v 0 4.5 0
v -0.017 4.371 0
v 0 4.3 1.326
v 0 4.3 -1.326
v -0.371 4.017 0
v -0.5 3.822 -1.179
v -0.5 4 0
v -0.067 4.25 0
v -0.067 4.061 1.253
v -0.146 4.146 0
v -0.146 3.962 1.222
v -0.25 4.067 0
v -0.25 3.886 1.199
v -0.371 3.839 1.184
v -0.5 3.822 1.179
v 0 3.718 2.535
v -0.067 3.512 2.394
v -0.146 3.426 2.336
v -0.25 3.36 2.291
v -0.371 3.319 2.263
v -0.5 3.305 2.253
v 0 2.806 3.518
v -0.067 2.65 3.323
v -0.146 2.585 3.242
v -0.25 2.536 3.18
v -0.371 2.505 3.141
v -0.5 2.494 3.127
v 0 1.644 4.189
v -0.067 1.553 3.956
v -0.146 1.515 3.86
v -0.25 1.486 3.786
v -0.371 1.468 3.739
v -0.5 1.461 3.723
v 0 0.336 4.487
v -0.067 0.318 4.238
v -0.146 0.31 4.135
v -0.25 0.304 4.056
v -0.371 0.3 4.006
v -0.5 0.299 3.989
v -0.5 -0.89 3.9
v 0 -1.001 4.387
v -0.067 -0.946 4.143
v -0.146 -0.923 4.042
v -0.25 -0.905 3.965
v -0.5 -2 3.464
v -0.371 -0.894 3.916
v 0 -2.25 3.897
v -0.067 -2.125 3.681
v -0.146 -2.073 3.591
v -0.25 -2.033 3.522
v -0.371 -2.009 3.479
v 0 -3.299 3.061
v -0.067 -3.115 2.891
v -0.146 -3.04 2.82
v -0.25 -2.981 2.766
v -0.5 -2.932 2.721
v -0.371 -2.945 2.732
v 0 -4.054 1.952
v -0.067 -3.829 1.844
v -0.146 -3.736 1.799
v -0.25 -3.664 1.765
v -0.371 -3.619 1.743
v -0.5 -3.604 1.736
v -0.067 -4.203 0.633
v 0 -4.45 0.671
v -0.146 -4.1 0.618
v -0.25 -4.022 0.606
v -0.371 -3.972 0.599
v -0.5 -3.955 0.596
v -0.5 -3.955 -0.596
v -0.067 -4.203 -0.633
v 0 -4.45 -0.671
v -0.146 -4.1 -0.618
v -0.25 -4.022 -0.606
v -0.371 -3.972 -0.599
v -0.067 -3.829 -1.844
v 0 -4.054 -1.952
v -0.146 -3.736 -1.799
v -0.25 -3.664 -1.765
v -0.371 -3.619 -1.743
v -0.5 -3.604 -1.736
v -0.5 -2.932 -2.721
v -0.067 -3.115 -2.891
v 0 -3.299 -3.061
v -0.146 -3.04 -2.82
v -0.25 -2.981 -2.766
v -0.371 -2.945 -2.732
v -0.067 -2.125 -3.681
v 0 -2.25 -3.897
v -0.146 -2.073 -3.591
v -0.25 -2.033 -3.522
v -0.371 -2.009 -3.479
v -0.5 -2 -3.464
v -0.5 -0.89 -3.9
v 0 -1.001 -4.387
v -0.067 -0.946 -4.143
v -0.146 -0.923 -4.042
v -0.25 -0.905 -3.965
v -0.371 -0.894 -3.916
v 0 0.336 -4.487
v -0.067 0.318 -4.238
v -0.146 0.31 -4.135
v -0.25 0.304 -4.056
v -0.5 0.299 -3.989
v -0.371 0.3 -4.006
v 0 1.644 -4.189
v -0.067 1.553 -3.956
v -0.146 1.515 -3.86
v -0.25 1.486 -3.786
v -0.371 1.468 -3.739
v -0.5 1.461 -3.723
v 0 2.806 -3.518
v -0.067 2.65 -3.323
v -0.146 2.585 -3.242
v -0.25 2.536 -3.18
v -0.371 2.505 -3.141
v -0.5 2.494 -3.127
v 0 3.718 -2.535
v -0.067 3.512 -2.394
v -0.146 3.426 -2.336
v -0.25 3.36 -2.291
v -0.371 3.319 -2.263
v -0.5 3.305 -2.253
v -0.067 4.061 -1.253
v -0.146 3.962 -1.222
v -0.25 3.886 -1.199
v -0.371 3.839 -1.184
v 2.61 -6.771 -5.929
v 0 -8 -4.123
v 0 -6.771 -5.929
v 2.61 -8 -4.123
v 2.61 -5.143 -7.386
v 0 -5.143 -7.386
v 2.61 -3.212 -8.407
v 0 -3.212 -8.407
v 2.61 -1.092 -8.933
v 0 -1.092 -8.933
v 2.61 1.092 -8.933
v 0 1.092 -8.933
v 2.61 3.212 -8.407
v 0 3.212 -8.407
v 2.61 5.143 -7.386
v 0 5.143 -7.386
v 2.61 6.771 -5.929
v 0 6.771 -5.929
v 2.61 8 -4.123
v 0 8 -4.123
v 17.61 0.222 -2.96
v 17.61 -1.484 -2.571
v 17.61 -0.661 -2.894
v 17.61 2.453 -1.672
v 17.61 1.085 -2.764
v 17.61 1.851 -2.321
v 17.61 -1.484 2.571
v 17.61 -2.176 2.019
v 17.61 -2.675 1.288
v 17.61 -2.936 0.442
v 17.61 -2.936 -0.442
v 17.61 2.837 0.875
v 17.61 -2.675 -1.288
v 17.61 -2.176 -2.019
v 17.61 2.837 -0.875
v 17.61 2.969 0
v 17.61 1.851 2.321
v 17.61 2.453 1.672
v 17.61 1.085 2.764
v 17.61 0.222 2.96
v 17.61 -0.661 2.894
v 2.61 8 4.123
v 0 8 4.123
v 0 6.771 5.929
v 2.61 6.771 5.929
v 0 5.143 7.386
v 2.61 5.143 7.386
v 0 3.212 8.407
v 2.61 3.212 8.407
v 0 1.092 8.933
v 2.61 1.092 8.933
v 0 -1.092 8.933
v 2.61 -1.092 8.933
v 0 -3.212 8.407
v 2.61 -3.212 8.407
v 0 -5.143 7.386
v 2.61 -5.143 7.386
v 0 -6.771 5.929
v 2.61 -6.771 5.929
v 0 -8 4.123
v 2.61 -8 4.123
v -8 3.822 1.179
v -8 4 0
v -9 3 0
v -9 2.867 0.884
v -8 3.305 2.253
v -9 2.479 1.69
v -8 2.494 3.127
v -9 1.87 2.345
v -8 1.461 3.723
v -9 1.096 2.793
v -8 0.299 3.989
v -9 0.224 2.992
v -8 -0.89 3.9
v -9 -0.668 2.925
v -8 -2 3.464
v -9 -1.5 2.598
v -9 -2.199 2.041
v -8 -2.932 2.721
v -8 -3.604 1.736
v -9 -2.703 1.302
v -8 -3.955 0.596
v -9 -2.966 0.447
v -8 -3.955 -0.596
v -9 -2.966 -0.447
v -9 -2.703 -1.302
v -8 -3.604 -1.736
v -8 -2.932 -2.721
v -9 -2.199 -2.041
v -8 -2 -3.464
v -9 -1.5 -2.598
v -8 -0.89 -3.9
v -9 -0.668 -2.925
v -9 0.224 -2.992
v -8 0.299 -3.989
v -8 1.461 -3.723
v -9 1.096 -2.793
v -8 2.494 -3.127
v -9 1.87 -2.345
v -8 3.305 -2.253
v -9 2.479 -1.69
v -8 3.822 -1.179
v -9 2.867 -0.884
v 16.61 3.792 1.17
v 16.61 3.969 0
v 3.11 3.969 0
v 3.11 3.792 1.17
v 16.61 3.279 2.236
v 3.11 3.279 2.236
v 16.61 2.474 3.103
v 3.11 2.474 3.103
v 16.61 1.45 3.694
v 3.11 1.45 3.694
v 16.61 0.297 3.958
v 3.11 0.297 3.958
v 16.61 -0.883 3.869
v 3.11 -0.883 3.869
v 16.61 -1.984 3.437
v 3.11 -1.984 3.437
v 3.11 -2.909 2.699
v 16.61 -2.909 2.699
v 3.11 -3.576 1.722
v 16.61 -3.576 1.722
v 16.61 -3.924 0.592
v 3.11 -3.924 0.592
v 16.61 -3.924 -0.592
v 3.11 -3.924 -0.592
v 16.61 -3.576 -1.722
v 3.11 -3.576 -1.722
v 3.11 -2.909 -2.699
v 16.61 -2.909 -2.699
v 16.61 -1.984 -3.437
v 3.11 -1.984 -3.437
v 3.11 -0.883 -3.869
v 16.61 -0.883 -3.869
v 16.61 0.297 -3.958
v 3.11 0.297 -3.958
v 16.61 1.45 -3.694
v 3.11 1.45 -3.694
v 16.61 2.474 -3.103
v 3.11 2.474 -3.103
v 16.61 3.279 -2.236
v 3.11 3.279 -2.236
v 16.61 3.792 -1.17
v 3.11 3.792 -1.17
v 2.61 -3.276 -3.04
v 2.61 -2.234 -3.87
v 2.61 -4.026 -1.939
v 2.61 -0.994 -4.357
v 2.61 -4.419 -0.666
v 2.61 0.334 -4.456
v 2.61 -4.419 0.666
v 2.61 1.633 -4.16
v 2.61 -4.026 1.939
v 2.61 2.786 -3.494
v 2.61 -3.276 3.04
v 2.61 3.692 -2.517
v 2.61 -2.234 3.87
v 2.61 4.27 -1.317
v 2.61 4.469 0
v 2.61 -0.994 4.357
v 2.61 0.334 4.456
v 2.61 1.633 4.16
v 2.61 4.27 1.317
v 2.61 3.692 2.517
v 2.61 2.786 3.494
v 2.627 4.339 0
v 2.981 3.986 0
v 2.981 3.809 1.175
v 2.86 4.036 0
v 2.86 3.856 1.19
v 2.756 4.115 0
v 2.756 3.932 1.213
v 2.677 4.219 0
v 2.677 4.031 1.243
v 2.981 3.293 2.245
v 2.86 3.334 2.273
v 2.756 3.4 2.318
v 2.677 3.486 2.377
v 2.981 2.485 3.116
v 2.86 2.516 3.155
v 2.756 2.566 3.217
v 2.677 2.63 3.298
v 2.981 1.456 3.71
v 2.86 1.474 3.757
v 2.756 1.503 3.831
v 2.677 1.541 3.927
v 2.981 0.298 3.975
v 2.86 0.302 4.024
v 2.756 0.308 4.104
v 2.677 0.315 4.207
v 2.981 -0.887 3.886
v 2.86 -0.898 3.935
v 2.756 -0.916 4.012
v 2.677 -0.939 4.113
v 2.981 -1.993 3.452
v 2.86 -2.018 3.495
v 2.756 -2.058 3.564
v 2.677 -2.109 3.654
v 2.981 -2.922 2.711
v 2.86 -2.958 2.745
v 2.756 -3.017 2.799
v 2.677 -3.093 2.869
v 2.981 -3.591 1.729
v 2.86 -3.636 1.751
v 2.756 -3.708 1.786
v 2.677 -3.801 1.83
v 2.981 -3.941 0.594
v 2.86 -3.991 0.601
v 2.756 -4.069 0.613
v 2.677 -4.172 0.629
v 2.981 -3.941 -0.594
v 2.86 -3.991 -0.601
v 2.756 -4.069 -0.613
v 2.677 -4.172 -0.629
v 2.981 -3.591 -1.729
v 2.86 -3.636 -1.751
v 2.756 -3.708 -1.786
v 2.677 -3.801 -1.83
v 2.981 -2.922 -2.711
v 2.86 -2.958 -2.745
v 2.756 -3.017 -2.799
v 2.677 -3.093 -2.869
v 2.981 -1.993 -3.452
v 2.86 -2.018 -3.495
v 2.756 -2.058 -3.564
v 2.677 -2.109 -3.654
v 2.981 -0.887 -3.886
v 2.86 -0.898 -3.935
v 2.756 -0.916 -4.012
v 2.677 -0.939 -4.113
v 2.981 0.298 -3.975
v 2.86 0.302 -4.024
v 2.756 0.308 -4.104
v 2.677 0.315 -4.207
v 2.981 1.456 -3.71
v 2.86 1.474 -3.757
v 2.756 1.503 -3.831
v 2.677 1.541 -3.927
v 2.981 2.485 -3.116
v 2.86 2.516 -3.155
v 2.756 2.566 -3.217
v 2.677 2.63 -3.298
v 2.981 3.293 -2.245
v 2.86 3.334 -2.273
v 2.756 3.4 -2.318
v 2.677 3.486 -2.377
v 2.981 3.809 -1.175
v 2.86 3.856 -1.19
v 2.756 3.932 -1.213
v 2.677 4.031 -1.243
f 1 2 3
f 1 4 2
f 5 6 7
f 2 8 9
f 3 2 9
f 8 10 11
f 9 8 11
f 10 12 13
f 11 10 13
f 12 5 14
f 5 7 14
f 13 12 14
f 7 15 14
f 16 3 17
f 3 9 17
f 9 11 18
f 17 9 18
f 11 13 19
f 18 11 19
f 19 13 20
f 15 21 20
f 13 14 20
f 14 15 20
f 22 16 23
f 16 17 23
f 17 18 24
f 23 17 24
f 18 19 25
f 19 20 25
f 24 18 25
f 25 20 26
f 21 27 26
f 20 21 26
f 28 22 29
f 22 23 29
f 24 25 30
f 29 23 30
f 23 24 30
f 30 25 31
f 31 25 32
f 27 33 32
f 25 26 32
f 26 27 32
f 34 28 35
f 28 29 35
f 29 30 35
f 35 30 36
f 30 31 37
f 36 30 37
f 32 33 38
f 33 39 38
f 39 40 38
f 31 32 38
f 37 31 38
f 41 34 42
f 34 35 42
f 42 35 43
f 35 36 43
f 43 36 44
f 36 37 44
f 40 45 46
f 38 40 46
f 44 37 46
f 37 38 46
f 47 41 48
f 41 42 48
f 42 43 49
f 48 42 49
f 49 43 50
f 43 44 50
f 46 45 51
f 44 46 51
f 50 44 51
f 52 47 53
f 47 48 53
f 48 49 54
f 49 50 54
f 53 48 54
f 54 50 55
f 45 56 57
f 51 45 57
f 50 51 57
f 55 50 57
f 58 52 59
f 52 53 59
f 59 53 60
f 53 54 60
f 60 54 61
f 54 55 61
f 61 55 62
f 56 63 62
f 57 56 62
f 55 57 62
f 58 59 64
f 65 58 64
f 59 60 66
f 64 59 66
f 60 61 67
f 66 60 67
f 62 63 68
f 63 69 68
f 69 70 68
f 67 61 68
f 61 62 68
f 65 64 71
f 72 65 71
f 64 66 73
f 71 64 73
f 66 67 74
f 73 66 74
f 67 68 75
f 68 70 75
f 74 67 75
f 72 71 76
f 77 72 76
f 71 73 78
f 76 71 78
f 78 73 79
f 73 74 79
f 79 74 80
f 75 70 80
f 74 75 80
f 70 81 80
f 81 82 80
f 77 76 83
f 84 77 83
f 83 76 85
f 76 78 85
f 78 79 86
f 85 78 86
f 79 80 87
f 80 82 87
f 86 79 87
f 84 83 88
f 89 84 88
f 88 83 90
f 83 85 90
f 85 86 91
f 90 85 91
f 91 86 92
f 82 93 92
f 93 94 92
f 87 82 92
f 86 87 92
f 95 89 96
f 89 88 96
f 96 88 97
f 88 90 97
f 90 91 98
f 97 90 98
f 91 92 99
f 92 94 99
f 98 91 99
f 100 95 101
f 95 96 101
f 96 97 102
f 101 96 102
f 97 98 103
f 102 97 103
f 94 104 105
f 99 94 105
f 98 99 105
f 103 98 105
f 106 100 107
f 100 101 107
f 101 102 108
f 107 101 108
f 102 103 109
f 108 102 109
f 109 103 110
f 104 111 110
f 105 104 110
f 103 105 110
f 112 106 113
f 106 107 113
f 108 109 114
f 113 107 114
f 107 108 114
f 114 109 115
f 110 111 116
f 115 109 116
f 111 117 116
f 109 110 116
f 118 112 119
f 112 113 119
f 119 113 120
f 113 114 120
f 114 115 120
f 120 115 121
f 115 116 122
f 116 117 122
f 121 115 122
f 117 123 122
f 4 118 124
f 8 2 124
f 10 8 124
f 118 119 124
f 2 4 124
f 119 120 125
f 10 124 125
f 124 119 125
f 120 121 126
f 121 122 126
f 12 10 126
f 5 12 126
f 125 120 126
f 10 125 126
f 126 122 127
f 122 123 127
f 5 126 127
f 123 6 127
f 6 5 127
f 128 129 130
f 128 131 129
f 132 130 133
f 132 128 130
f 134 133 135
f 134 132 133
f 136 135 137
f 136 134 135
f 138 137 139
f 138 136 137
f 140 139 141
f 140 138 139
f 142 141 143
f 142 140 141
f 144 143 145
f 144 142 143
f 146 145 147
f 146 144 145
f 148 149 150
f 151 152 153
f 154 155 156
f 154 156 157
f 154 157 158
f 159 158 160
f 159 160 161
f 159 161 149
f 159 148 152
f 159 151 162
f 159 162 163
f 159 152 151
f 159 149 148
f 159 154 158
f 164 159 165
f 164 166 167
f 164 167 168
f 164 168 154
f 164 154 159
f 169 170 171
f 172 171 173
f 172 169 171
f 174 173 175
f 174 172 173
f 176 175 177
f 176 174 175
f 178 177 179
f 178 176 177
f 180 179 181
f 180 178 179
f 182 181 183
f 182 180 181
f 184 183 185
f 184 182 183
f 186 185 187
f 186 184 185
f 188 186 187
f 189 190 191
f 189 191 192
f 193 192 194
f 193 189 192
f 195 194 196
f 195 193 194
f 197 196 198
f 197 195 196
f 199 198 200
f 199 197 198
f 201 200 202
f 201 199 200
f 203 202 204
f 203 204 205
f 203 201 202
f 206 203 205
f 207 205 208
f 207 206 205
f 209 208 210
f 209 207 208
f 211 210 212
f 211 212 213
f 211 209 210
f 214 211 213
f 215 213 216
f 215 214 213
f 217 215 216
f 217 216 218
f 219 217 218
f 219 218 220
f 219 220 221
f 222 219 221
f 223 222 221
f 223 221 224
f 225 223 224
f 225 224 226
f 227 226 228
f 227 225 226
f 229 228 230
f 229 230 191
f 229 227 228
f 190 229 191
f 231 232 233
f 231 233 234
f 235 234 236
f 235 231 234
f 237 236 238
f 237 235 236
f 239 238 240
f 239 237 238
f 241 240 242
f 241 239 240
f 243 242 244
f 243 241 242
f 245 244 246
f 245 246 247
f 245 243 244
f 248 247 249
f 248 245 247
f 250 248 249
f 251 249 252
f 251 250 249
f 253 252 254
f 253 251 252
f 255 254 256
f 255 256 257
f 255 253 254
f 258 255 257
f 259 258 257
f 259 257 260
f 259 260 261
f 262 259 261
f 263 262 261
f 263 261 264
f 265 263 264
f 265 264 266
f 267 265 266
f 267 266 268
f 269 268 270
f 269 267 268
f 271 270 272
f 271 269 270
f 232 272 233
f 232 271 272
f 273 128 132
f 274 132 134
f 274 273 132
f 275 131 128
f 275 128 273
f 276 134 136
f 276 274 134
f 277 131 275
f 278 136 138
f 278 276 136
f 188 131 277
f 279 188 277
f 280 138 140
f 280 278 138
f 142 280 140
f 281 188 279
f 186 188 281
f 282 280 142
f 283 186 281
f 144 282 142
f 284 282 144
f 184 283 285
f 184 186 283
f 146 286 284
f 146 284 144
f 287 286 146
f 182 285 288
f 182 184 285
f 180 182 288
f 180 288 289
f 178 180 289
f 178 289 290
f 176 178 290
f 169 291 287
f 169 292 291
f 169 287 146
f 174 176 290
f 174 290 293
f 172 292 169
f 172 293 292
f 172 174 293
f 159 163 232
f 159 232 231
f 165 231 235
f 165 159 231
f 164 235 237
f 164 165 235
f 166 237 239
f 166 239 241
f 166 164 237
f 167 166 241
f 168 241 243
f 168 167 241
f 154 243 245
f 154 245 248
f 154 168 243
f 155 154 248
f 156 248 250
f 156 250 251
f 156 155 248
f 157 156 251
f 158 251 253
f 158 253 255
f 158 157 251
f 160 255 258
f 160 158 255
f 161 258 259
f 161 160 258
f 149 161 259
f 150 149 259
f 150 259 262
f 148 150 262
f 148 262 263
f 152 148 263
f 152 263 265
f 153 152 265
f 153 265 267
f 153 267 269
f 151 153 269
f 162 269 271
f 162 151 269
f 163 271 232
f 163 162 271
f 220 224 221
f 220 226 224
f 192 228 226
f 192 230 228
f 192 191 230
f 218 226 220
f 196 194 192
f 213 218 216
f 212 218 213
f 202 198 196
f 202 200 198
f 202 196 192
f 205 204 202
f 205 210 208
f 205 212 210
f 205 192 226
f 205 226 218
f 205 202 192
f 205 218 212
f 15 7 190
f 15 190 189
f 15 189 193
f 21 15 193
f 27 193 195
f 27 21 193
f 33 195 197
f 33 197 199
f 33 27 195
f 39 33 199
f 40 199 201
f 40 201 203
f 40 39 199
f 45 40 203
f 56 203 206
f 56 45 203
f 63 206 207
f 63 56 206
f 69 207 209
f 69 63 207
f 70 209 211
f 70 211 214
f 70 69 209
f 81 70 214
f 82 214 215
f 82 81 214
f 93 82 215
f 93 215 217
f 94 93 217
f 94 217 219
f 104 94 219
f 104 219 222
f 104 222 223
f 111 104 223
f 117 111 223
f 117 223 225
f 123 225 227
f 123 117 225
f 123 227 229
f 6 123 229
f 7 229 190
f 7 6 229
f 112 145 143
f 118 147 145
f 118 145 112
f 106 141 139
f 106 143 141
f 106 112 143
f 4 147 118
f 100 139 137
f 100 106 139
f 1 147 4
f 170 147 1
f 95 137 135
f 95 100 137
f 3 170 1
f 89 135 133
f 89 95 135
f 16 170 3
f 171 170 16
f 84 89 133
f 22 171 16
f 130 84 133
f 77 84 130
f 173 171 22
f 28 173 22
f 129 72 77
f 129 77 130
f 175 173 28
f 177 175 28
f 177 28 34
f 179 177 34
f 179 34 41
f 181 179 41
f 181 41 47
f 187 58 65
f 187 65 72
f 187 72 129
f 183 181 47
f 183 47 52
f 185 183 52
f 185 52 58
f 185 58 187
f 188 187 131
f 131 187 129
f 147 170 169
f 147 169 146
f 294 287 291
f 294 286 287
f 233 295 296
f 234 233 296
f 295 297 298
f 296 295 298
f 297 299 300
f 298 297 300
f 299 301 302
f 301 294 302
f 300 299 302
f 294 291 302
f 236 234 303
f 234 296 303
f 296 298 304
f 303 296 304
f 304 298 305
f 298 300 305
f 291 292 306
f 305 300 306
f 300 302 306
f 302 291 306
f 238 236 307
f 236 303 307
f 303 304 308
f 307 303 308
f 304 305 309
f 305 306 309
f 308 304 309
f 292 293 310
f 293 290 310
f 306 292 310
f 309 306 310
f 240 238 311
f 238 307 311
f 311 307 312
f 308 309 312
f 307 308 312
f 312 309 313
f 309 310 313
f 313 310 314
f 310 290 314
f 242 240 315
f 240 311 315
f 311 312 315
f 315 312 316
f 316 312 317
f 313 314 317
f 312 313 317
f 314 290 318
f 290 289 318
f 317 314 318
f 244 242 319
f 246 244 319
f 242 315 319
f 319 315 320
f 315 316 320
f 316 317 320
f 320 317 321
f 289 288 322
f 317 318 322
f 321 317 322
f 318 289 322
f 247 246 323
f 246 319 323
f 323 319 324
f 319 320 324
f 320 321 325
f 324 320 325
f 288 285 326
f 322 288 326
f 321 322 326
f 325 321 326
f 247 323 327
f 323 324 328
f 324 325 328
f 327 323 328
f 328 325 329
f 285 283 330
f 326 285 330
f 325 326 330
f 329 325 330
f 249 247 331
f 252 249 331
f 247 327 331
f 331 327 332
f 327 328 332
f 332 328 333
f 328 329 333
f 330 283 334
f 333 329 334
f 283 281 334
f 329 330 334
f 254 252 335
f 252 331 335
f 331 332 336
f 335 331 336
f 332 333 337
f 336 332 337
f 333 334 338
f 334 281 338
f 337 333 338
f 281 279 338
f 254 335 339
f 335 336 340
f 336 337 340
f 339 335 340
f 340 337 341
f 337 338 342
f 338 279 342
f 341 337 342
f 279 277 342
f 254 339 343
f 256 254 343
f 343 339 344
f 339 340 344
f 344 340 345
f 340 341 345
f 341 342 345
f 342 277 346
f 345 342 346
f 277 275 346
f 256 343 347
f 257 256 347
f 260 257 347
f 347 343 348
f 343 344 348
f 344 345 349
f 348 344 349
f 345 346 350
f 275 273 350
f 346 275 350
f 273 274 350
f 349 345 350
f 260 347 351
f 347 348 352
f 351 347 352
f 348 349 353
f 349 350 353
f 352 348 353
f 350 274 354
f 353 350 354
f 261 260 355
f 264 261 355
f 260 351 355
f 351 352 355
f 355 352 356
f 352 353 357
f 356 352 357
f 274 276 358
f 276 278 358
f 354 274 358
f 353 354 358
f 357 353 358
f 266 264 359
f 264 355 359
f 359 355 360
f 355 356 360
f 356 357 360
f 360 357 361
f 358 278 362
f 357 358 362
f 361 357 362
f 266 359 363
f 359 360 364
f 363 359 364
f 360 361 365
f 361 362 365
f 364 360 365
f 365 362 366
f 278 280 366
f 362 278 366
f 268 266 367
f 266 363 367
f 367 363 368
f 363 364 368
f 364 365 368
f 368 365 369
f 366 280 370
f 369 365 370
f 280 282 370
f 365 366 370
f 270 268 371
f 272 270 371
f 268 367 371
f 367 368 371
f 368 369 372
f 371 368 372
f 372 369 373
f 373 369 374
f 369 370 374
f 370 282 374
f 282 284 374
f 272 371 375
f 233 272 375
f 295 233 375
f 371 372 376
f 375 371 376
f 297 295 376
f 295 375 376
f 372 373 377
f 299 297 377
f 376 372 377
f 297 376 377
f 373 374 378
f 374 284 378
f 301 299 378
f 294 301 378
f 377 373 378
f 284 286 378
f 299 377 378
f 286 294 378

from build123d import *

# Parameters (mm, degrees)
CHAMFER1_SIZE           = 1
FILLET1_R               = 0.5
SKETCH2_OUTSIDE_W       = 27.366
SKETCH2_OUTSIDE_H       = 27.366
SKETCH2_OUTSIDE_W_2     = 26.756004186
SKETCH2_OUTSIDE_H_2     = 16
CUT_EXTRUDE1_DEPTH      = 18.61
CUT_EXTRUDE1_DEPTH_BACK = 10


with BuildPart() as part:
    # Sketch1 → Revolve1 (revolve)
    with BuildSketch(Plane.XY):
        Polygon((0, 4), (0, 9), (2.61, 9), (2.61, 3.96875), (17.61, 3.96875), (17.61, 0), (-9, 0), (-9, 4), align=None)
    revolve(axis=Axis((-38.174026976, 0, 0), (1, 0, 0)))

    # Chamfer1
    chamfer1_edges = [part.edges().sort_by_distance(p)[0] for p in [
        (17.61, -3.96875, 0),
        (-9, -4, 0),
    ]]
    chamfer(chamfer1_edges, length=CHAMFER1_SIZE)

    # Fillet1
    fillet1_edges = [part.edges().sort_by_distance(p)[0] for p in [
        (0, -4, 0),
        (2.61, -3.96875, 0),
    ]]
    fillet(fillet1_edges, radius=FILLET1_R)

    # Sketch2 outside → Cut-Extrude1 (cut, two sides)
    with BuildSketch(Plane(origin=(0, 0, 0), x_dir=(0, 0, -1), z_dir=(1, 0, 0))) as cut_extrude1_sk:
        Rectangle(SKETCH2_OUTSIDE_W, SKETCH2_OUTSIDE_H)
        Rectangle(SKETCH2_OUTSIDE_W_2, SKETCH2_OUTSIDE_H_2, mode=Mode.SUBTRACT)
    extrude(amount=CUT_EXTRUDE1_DEPTH, mode=Mode.SUBTRACT)
    extrude(cut_extrude1_sk.sketch, amount=-CUT_EXTRUDE1_DEPTH_BACK, mode=Mode.SUBTRACT)


solid = part.part
